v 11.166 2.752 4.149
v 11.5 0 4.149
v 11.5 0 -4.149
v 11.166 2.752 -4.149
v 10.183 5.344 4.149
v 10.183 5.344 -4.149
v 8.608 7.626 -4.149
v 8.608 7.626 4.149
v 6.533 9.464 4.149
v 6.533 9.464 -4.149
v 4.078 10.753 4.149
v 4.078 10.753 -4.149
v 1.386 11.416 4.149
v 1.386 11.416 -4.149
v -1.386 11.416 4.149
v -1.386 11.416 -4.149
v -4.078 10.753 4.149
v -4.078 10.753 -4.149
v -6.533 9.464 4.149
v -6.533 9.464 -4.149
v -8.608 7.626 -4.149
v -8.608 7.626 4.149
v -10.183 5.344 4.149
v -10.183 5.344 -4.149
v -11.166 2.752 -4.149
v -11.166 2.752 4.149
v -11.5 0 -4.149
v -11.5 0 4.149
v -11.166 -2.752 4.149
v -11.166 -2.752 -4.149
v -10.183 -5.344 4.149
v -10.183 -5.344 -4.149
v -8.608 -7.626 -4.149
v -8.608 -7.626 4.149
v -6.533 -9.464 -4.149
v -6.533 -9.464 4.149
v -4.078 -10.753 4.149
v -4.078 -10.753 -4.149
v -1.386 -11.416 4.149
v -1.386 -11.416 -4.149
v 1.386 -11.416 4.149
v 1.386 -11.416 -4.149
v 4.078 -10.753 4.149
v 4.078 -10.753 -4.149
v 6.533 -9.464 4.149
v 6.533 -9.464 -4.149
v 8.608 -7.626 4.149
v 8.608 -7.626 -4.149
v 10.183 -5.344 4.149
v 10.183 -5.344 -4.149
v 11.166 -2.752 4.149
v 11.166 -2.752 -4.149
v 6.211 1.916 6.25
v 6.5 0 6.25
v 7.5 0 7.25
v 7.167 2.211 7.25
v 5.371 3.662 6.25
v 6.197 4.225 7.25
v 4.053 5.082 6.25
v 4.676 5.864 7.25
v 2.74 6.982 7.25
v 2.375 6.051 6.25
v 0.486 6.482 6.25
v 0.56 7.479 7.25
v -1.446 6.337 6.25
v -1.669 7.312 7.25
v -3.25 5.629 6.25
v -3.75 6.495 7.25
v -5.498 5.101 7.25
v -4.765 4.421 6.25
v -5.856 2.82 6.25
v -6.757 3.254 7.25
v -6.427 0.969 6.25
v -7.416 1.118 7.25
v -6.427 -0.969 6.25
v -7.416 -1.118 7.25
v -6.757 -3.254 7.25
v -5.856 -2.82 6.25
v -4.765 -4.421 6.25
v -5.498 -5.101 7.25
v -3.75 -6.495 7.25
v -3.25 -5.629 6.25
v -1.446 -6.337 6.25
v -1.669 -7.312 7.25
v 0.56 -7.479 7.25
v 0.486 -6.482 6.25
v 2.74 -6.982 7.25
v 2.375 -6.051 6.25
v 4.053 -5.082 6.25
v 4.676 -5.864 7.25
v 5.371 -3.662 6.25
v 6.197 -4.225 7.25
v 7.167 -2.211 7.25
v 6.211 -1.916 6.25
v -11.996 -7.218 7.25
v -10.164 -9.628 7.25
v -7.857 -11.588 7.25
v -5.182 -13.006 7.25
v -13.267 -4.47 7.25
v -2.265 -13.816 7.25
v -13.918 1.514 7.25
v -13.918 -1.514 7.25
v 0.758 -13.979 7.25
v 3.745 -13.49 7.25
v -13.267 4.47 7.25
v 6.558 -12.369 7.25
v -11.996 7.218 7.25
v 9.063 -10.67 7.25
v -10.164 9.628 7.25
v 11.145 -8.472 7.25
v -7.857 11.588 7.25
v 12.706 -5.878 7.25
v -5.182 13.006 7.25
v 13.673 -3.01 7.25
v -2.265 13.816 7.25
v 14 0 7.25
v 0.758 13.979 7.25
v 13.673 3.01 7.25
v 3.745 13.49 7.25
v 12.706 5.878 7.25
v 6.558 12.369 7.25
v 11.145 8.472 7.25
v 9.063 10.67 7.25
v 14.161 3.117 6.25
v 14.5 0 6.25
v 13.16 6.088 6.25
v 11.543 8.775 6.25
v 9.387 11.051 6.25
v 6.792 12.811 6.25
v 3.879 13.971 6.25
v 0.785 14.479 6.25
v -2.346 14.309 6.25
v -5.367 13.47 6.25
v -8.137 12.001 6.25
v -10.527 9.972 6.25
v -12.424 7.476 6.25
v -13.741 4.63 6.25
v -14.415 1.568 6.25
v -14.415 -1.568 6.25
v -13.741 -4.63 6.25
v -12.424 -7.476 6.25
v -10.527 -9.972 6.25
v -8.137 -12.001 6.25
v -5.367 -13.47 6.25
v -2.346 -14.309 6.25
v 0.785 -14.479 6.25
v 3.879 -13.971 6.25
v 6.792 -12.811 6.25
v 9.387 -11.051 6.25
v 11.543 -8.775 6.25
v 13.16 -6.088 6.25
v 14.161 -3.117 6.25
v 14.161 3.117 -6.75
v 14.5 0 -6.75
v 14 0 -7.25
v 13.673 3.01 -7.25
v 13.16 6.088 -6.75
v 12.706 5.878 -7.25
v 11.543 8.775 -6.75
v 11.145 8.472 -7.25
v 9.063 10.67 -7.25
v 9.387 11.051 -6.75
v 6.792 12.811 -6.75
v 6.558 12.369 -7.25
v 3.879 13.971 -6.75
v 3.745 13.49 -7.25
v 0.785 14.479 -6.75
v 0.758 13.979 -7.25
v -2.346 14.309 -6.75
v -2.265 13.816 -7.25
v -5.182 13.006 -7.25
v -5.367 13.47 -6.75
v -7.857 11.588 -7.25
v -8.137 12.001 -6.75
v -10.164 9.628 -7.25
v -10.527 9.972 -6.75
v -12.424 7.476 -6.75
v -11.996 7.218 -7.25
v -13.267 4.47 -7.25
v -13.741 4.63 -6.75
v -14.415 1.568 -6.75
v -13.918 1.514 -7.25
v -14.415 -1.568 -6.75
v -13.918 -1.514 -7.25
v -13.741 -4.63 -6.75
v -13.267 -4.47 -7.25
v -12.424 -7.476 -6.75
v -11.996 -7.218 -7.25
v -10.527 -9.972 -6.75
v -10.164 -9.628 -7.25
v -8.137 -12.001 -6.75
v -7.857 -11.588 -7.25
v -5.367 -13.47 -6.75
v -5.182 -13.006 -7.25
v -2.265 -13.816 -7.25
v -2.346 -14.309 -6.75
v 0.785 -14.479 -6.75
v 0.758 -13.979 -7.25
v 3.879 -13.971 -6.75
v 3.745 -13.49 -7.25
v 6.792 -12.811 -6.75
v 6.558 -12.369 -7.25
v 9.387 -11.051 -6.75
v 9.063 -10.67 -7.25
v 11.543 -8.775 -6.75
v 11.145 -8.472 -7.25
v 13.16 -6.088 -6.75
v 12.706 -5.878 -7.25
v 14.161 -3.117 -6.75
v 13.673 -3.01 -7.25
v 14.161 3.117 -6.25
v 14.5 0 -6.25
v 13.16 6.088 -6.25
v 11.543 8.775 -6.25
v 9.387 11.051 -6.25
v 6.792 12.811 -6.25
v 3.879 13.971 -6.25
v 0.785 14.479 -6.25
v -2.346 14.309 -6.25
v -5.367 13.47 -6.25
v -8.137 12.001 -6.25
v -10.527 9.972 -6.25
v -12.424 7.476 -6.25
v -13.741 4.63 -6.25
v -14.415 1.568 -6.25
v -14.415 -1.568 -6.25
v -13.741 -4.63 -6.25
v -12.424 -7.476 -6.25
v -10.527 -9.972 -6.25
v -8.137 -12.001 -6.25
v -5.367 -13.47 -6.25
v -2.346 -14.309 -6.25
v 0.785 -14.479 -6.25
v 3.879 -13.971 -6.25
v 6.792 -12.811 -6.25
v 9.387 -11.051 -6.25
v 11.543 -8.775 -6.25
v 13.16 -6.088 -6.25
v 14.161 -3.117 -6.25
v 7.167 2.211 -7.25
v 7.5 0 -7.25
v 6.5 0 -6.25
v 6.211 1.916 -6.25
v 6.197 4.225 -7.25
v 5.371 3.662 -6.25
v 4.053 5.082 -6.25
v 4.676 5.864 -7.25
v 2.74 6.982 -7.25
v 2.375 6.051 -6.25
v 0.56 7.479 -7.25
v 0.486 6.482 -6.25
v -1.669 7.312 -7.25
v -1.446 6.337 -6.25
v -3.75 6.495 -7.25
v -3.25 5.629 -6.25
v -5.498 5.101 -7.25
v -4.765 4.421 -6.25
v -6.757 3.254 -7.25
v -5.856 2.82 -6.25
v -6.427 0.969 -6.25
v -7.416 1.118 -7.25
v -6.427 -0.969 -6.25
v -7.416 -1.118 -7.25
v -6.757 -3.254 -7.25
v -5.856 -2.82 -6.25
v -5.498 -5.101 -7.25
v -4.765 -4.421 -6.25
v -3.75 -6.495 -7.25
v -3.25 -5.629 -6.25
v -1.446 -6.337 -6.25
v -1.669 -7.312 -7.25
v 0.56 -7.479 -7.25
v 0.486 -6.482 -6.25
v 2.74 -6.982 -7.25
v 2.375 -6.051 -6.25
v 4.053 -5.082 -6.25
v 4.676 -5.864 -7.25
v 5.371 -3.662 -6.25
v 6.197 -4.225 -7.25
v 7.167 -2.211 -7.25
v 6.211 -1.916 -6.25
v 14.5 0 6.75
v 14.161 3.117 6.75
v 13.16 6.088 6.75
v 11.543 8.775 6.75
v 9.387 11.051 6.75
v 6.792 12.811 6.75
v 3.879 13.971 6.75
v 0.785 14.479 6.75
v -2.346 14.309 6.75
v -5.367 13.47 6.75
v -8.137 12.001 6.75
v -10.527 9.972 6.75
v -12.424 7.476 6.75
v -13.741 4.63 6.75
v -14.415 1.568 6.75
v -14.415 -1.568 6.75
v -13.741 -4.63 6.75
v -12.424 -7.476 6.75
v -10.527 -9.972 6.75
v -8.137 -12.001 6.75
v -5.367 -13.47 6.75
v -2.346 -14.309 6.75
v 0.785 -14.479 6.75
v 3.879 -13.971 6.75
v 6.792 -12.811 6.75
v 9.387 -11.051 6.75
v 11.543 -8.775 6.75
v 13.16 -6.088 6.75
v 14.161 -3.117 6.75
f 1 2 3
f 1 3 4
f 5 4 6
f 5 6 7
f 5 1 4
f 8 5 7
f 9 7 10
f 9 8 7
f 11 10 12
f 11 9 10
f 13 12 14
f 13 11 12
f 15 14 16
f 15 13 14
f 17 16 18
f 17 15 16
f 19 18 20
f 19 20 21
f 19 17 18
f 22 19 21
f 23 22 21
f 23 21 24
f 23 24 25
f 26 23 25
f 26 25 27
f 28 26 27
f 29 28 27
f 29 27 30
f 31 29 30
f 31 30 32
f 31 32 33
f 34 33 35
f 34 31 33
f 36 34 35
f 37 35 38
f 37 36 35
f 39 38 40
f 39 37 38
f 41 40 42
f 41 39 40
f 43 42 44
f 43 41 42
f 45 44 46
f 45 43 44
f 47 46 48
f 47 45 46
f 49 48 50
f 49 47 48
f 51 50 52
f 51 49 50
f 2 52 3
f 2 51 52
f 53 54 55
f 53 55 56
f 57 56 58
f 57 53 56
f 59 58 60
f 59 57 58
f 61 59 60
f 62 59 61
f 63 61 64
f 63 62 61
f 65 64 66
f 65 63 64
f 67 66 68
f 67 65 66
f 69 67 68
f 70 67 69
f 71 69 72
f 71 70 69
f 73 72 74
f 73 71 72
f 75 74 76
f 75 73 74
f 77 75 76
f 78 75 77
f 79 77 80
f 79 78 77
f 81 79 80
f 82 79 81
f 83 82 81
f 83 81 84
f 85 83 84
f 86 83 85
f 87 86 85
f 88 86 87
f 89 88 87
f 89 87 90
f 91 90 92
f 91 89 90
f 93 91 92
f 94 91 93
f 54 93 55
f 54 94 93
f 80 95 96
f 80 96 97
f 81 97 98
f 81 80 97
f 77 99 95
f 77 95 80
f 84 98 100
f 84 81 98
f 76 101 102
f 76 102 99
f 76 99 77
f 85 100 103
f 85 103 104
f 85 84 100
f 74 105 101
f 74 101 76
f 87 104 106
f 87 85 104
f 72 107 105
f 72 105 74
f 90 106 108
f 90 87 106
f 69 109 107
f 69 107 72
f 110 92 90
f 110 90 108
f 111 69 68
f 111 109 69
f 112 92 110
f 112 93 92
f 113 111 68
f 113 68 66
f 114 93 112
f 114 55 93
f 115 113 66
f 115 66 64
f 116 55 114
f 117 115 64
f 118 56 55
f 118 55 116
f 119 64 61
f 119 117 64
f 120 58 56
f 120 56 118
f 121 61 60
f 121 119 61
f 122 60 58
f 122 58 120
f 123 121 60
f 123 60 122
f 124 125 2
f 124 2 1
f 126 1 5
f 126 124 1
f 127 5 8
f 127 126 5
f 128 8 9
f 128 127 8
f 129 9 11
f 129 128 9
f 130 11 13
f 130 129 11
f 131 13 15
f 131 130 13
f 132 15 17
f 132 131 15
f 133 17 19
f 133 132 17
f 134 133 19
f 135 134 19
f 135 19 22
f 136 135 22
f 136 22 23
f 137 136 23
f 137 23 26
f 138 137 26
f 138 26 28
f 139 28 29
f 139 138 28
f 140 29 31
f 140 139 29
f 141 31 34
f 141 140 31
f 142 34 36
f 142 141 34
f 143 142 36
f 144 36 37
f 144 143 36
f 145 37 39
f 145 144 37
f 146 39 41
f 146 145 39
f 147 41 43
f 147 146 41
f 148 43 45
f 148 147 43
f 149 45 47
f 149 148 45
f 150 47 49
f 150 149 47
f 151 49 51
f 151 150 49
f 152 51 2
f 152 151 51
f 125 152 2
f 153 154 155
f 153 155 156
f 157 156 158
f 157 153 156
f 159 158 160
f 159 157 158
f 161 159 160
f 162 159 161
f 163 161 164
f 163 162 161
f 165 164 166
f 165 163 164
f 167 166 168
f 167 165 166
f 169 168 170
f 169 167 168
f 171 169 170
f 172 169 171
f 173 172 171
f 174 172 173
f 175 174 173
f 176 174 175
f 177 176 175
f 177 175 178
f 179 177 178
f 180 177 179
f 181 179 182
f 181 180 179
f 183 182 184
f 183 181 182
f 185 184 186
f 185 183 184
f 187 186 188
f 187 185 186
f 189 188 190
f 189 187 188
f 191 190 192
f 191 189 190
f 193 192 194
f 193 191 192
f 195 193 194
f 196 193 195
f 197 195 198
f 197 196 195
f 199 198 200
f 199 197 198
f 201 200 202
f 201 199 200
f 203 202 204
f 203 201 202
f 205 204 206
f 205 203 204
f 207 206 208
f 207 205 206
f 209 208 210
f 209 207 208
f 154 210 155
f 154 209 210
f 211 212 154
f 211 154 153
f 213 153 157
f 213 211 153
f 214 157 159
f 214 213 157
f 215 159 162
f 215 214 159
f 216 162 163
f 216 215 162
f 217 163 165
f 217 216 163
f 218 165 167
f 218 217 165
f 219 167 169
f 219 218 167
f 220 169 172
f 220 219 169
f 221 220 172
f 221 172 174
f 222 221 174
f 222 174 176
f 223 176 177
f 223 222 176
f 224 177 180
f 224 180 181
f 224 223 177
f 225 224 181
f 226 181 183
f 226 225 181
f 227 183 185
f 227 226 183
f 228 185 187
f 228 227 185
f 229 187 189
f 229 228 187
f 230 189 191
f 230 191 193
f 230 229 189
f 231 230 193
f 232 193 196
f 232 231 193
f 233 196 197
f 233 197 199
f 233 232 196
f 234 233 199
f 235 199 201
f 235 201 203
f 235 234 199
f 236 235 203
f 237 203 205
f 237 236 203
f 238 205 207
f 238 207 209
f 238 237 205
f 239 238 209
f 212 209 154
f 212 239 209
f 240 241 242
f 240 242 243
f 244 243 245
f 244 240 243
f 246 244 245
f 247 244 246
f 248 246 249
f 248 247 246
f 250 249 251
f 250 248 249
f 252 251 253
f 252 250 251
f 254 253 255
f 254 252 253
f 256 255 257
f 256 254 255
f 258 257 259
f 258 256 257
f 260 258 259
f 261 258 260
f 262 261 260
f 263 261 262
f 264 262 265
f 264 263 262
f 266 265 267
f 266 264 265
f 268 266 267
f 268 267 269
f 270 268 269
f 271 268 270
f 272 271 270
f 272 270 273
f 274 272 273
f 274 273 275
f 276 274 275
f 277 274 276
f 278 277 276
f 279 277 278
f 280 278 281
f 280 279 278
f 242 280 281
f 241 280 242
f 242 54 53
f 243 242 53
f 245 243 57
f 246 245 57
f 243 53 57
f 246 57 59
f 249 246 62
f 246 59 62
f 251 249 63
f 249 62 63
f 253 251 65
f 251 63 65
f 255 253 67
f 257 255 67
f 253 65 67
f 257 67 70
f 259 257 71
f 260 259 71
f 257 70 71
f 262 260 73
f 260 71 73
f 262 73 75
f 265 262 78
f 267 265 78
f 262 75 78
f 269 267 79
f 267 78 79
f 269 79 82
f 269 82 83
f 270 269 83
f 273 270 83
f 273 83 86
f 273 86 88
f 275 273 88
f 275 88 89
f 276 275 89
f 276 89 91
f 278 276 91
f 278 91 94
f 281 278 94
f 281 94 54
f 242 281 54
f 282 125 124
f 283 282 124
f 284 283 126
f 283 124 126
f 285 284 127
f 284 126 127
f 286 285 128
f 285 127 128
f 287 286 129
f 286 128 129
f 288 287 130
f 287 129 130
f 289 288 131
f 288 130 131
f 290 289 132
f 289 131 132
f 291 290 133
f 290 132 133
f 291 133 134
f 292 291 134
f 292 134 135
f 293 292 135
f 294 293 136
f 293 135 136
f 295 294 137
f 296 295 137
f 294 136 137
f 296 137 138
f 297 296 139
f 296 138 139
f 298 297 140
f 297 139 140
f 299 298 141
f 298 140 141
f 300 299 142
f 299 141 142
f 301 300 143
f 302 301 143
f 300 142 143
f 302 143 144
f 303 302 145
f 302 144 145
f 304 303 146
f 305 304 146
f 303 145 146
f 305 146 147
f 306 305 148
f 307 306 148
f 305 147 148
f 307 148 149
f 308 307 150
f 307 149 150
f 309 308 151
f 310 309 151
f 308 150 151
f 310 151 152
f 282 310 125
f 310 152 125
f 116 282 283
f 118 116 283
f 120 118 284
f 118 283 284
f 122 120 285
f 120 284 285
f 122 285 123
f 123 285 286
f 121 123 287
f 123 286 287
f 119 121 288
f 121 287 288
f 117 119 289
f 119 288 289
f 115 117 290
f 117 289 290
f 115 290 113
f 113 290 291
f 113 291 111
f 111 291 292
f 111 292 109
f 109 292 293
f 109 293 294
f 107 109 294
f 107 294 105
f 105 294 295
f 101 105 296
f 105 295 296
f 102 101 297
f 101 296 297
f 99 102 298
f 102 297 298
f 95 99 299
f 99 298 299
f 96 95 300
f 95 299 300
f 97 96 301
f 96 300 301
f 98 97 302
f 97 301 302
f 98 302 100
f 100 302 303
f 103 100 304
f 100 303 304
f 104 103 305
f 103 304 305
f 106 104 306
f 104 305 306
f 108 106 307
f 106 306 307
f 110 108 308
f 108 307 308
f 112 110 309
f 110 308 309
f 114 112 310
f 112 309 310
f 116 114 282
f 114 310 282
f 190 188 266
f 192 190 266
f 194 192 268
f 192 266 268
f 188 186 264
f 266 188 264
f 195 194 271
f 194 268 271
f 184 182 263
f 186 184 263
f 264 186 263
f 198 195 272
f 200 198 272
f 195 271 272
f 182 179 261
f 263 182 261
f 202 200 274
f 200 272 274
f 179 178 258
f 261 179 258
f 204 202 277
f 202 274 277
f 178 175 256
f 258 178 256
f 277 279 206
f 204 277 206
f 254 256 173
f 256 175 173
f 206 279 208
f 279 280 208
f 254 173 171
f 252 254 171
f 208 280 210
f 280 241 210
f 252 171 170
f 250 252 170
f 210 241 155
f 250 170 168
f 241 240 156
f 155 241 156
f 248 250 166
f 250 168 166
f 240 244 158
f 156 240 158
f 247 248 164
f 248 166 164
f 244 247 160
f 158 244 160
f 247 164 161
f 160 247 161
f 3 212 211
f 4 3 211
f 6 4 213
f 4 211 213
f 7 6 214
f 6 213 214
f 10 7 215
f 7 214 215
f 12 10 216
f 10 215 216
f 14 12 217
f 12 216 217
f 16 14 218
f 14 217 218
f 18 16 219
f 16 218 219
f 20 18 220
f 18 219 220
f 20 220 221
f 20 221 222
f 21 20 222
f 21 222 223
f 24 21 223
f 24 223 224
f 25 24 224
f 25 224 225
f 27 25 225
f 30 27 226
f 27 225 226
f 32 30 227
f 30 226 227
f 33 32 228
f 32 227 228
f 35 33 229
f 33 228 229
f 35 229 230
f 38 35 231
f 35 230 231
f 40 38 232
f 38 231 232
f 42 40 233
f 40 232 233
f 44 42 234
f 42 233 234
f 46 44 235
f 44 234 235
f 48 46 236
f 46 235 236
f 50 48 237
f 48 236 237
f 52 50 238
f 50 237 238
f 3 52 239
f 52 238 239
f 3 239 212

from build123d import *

# Parameters (mm, degrees)
SKETCH1_R           = 11.5
SKETCH1_R_2         = 6.5
BOSS_EXTRUDE1_DEPTH = 6.25
SKETCH2_R           = 14.5
SKETCH2_R_2         = 6.5
BOSS_EXTRUDE2_DEPTH = 1
CHAMFER1_SIZE       = 2.100622615
CHAMFER1_SIZE_2     = 3
CHAMFER2_SIZE       = 1
CHAMFER3_SIZE       = 0.5


with BuildPart() as part:
    # Sketch1 → Boss-Extrude1 (new, symmetric)
    with BuildSketch(Plane.XY):
        Circle(SKETCH1_R)
        Circle(SKETCH1_R_2, mode=Mode.SUBTRACT)
    extrude(amount=BOSS_EXTRUDE1_DEPTH, both=True)

    # Sketch2 → Boss-Extrude2 (add)
    with BuildSketch(Plane.XY.offset(6.25)):
        Circle(SKETCH2_R)
        Circle(SKETCH2_R_2, mode=Mode.SUBTRACT)
    boss_extrude2 = extrude(amount=BOSS_EXTRUDE2_DEPTH)

    # Mirror1: Boss-Extrude2 across plane
    add(boss_extrude2.mirror(Plane.XY))

    # Chamfer1
    # the kernel refuses this chamfer: 3, 2.100622615 mm, written as the material it adds along each edge
    with BuildSketch(Plane(origin=(0, 0, -6.25), x_dir=(1, 0, 0), z_dir=(0, -1, 0))) as chamfer1_piece_1_section:
        Polygon((11.5, CHAMFER1_SIZE), (11.5 + CHAMFER1_SIZE_2, 0), (11.5, 0), align=None)
    chamfer1_piece_1 = revolve(axis=Axis((0, 0, -6.25), (0, 0, 1)), mode=Mode.PRIVATE)
    chamfer1_piece_1 = chamfer1_piece_1 & Plane(origin=(0, 0, -5.218650002), x_dir=(1, 0, 0), z_dir=(0, 0, 1)) * Cylinder(14.5, 58, mode=Mode.PRIVATE)
    add(chamfer1_piece_1)
    with BuildSketch(Plane(origin=(0, 0, 6.25), x_dir=(1, 0, 0), z_dir=(0, -1, 0))) as chamfer1_piece_2_section:
        Polygon((11.5, -CHAMFER1_SIZE), (11.5 + CHAMFER1_SIZE_2, 0), (11.5, 0), align=None)
    chamfer1_piece_2 = revolve(axis=Axis((0, 0, 6.25), (0, 0, 1)), mode=Mode.PRIVATE)
    chamfer1_piece_2 = chamfer1_piece_2 & Plane(origin=(0, 0, 5.218650002), x_dir=(1, 0, 0), z_dir=(0, 0, -1)) * Cylinder(14.5, 58, mode=Mode.PRIVATE)
    add(chamfer1_piece_2)

    # Chamfer2
    chamfer2_edges = [part.edges().sort_by_distance(p)[0] for p in [
        (-6.5, 0, 7.25),
        (-6.5, 0, -7.25),
    ]]
    chamfer(chamfer2_edges, length=CHAMFER2_SIZE)

    # Chamfer3
    chamfer3_edges = [part.edges().sort_by_distance(p)[0] for p in [
        (-14.5, 0, 7.25),
        (-14.5, 0, -7.25),
    ]]
    chamfer(chamfer3_edges, length=CHAMFER3_SIZE)


solid = part.part
